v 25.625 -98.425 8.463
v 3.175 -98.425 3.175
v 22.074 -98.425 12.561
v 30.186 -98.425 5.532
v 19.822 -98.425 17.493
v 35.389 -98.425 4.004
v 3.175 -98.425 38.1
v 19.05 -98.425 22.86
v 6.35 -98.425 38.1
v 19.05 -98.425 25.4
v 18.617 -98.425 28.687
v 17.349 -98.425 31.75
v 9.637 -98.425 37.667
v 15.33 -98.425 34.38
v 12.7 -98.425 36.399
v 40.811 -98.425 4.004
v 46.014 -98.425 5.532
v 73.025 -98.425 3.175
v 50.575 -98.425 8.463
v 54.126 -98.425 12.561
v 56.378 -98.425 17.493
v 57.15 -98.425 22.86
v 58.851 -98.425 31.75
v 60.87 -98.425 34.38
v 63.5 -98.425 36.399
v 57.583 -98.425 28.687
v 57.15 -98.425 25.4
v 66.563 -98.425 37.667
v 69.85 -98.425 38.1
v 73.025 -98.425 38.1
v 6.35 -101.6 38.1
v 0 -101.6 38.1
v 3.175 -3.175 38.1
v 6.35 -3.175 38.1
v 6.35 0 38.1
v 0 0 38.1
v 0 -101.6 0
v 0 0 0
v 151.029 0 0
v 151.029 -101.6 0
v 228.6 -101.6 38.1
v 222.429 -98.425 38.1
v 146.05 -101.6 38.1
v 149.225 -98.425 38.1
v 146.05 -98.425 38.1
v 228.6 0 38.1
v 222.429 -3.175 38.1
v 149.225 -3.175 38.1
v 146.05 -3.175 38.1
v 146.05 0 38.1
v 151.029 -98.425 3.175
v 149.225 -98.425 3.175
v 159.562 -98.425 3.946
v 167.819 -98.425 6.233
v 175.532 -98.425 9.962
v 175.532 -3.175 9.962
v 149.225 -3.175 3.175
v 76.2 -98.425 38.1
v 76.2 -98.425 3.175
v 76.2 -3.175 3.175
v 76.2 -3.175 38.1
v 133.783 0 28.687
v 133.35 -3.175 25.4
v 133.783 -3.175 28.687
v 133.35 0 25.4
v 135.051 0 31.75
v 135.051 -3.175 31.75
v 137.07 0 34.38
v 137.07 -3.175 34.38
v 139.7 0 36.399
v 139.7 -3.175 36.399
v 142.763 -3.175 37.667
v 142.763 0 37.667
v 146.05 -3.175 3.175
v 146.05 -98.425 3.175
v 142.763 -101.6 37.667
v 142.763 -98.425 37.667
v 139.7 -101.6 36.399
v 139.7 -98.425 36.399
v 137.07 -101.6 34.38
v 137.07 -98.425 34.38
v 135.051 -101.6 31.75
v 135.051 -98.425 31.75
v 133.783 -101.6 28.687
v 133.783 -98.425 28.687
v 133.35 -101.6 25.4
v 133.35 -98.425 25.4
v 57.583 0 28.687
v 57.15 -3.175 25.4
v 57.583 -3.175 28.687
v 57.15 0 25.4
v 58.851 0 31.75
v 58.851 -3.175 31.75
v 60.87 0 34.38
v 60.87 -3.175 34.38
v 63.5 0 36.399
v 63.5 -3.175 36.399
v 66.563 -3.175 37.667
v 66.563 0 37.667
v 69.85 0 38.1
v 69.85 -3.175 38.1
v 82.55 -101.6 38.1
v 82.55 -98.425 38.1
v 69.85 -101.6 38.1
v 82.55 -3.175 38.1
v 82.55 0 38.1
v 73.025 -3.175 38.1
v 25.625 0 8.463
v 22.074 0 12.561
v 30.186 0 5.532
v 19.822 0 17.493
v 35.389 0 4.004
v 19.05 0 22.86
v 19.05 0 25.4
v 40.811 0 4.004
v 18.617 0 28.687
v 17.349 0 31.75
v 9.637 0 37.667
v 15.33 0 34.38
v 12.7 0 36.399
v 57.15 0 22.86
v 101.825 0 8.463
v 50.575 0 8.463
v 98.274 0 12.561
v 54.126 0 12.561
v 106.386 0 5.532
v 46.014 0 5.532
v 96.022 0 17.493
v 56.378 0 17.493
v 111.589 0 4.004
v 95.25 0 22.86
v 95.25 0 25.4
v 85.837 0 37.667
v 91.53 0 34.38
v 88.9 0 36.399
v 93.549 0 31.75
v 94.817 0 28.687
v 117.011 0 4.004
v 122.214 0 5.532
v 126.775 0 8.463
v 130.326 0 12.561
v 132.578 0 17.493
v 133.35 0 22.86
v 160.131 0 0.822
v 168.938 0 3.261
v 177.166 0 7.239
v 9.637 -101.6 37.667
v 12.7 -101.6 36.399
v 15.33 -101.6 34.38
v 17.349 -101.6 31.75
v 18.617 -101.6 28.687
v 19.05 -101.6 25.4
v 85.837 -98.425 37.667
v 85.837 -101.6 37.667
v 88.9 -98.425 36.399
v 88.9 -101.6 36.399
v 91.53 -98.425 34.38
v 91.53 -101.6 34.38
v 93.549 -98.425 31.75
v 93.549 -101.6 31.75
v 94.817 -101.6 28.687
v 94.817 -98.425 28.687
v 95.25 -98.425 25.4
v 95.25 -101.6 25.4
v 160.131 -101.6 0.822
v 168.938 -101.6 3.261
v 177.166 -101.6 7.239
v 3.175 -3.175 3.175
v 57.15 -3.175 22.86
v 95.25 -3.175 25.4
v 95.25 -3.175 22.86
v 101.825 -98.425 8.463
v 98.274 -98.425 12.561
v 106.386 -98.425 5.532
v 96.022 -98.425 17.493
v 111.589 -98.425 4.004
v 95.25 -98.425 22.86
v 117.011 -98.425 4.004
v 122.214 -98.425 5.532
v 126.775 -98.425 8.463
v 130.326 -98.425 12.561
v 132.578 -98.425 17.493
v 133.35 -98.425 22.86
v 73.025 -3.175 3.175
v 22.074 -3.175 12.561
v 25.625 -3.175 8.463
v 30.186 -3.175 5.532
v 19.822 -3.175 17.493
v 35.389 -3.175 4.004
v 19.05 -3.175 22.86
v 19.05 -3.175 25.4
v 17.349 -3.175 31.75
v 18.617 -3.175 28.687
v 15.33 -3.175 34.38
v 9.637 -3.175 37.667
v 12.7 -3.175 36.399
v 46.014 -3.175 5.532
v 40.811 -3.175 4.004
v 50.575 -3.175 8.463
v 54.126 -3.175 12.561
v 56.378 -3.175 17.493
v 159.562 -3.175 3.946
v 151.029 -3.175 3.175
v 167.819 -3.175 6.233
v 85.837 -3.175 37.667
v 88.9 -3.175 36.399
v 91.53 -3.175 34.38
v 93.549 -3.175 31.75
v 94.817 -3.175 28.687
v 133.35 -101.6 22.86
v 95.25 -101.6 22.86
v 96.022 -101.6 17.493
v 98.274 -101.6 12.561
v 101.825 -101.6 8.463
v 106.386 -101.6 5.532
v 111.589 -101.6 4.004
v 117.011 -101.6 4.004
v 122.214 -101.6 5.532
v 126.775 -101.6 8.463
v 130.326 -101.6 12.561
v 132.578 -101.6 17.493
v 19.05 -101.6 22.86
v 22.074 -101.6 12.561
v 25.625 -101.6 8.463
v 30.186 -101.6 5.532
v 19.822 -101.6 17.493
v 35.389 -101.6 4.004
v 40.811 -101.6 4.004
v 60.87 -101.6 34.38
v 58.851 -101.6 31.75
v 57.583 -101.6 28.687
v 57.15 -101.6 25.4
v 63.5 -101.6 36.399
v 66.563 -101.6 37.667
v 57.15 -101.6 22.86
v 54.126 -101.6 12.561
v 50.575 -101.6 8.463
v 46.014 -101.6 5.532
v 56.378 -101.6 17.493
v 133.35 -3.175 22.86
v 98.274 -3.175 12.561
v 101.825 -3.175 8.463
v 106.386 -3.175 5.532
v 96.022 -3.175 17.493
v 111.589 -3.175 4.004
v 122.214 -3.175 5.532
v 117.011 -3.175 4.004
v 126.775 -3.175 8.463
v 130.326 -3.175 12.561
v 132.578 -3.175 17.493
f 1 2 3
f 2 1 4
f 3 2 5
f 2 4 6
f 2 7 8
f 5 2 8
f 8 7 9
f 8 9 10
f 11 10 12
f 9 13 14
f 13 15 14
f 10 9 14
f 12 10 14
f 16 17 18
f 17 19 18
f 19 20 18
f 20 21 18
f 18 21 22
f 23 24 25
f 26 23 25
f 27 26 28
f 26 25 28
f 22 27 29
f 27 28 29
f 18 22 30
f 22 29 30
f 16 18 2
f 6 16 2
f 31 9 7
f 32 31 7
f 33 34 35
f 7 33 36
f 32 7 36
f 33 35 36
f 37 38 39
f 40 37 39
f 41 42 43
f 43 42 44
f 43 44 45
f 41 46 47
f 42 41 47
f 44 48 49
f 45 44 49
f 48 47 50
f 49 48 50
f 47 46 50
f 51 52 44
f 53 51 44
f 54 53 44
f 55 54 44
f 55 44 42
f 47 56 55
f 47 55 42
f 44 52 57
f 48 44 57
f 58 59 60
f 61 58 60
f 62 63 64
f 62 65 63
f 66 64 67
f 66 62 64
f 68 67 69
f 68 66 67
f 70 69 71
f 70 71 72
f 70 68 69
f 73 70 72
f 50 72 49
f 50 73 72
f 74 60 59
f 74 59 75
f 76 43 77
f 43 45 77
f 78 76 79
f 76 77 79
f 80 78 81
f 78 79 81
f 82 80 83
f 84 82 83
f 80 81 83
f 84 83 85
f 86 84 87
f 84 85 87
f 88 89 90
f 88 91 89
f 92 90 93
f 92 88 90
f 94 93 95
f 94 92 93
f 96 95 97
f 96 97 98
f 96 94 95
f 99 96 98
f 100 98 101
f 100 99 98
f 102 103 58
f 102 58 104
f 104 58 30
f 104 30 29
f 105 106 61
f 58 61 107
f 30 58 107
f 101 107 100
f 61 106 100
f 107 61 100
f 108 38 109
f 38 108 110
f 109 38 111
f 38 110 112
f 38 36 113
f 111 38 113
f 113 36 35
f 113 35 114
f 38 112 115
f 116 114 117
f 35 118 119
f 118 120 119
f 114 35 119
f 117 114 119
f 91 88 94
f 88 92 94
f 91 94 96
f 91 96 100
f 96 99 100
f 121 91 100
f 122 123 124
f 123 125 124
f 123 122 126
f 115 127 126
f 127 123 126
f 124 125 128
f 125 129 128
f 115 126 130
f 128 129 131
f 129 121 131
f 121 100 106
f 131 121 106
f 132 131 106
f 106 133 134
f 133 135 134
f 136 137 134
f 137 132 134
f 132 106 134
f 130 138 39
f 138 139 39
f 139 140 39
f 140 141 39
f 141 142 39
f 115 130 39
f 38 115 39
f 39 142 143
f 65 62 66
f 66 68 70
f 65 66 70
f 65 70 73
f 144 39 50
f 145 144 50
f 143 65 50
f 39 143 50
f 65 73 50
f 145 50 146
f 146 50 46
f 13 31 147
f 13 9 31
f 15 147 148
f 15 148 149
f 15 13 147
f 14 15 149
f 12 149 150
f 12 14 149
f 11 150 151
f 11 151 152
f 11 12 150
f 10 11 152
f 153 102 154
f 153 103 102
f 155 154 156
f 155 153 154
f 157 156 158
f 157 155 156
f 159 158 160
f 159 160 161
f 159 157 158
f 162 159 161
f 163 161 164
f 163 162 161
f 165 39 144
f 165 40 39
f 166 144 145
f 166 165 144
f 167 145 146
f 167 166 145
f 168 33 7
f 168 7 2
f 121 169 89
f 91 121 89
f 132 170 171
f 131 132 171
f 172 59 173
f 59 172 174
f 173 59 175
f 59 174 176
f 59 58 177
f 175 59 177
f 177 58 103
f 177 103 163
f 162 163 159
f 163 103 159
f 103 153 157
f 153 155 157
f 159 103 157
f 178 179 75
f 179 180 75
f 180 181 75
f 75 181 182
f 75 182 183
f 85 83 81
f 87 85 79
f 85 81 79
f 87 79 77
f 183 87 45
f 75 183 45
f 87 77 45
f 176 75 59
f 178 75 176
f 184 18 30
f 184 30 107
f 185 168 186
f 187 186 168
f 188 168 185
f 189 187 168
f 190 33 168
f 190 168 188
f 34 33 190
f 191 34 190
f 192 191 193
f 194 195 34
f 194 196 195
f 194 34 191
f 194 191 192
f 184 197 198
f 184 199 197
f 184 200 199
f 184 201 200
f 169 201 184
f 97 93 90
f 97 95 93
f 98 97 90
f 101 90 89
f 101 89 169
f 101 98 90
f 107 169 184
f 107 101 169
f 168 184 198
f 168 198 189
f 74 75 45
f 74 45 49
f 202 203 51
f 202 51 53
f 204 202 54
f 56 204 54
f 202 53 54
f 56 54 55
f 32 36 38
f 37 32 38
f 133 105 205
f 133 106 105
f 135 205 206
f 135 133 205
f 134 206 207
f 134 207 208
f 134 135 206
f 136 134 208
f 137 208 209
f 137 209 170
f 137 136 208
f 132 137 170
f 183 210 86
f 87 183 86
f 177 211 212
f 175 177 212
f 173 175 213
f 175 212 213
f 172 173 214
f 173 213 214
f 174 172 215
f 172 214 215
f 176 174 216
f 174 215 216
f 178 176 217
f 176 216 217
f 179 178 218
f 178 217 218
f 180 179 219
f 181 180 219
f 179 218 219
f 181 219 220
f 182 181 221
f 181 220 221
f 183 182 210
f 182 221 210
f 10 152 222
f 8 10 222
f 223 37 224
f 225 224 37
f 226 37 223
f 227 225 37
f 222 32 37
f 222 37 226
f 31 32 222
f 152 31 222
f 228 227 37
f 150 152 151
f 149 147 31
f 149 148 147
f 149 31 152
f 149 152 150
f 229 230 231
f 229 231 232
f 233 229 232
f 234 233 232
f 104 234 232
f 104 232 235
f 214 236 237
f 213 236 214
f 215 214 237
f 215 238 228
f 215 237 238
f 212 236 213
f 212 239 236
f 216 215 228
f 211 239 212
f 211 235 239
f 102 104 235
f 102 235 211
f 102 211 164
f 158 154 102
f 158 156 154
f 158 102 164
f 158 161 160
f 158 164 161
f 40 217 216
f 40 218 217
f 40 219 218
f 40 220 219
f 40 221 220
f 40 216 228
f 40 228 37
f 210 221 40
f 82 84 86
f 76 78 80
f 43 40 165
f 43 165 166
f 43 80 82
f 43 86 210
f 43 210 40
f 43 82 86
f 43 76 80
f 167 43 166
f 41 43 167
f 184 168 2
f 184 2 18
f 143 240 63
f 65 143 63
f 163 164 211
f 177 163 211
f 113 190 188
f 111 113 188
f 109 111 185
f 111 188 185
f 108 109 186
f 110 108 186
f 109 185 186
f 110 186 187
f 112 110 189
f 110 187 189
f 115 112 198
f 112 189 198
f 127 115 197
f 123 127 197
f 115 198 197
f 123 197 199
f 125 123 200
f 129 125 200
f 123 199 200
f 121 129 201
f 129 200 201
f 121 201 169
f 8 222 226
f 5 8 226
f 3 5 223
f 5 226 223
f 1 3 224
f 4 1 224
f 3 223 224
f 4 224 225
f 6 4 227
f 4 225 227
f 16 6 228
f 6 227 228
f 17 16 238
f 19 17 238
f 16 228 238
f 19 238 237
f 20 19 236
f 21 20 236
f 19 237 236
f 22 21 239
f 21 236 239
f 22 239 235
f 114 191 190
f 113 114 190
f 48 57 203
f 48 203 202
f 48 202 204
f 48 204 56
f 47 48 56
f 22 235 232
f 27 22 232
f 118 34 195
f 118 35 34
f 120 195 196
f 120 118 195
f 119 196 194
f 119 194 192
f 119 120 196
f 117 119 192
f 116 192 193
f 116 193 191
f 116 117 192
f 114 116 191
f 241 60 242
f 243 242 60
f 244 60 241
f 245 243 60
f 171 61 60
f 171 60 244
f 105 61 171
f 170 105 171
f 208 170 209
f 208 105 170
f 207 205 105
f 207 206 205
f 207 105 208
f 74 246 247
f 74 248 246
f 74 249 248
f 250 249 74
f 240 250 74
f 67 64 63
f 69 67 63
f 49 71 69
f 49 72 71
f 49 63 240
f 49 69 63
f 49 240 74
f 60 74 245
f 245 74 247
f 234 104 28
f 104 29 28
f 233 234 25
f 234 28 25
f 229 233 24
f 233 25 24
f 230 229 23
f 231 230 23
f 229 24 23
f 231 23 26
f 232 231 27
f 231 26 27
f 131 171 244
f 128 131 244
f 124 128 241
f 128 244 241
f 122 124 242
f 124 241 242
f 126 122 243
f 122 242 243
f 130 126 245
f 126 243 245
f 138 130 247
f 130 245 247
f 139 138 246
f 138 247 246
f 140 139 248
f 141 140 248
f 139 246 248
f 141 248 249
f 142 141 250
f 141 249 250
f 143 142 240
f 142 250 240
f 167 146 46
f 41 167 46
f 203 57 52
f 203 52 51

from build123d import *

# Parameters (mm, degrees)
F1_DEPTH = 101.6
F2_R     = 50.8
F3_T     = -3.175
F4_W     = 3.175
F4_H     = 95.25
F5_DEPTH = 34.925
F7_DEPTH = 101.601
F8_R     = 12.7


with BuildPart() as f1:
    # F0 (on Front) → F1 (new body)
    with BuildSketch(Plane.XZ):
        Polygon((0, 38.1), (0, 0), (165.1, 0), (228.6, 38.1), align=None)
    extrude(amount=F1_DEPTH)

    # F2
    f2_edges = [f1.edges().sort_by_distance(p)[0] for p in [
        (165.1, -50.8, 0),
    ]]
    fillet(f2_edges, radius=F2_R)

    # F3
    f3_openings = [f1.faces().sort_by_distance(p)[0] for p in [
        (114.3, -50.8, 38.1),
    ]]
    offset(amount=F3_T, openings=f3_openings)

    # F4 (on face) → F5 (join, through all)
    with BuildSketch(Plane.XY.offset(3.175)):
        with Locations((74.6125, -50.8)):
            Rectangle(F4_W, F4_H)
        with Locations((147.6375, -50.8)):
            Rectangle(F4_W, F4_H)
    extrude(amount=F5_DEPTH)

    # F6 (on face) → F7 (cut, through all)
    with BuildSketch(Plane.XZ.offset(101.6)):
        with BuildLine():
            Line((57.15, 38.1), (19.05, 38.1))
            Line((19.05, 38.1), (19.05, 22.86))
            ThreePointArc((19.05, 22.86), (38.1, 3.81), (57.15, 22.86))
            Line((57.15, 22.86), (57.15, 38.1))
        make_face()
        with BuildLine():
            Line((133.35, 38.1), (95.25, 38.1))
            Line((95.25, 38.1), (95.25, 22.86))
            ThreePointArc((95.25, 22.86), (114.3, 3.81), (133.35, 22.86))
            Line((133.35, 22.86), (133.35, 38.1))
        make_face()
    extrude(amount=-F7_DEPTH, mode=Mode.SUBTRACT)

    # F8
    f8_edges = [f1.edges().sort_by_distance(p)[0] for p in [
        (19.05, -100.0125, 38.1),
        (57.15, -100.0125, 38.1),
        (19.05, -1.5875, 38.1),
        (57.15, -1.5875, 38.1),
        (95.25, -100.0125, 38.1),
        (133.35, -100.0125, 38.1),
        (133.35, -1.5875, 38.1),
        (95.25, -1.5875, 38.1),
    ]]
    fillet(f8_edges, radius=F8_R)


solid = f1.part
